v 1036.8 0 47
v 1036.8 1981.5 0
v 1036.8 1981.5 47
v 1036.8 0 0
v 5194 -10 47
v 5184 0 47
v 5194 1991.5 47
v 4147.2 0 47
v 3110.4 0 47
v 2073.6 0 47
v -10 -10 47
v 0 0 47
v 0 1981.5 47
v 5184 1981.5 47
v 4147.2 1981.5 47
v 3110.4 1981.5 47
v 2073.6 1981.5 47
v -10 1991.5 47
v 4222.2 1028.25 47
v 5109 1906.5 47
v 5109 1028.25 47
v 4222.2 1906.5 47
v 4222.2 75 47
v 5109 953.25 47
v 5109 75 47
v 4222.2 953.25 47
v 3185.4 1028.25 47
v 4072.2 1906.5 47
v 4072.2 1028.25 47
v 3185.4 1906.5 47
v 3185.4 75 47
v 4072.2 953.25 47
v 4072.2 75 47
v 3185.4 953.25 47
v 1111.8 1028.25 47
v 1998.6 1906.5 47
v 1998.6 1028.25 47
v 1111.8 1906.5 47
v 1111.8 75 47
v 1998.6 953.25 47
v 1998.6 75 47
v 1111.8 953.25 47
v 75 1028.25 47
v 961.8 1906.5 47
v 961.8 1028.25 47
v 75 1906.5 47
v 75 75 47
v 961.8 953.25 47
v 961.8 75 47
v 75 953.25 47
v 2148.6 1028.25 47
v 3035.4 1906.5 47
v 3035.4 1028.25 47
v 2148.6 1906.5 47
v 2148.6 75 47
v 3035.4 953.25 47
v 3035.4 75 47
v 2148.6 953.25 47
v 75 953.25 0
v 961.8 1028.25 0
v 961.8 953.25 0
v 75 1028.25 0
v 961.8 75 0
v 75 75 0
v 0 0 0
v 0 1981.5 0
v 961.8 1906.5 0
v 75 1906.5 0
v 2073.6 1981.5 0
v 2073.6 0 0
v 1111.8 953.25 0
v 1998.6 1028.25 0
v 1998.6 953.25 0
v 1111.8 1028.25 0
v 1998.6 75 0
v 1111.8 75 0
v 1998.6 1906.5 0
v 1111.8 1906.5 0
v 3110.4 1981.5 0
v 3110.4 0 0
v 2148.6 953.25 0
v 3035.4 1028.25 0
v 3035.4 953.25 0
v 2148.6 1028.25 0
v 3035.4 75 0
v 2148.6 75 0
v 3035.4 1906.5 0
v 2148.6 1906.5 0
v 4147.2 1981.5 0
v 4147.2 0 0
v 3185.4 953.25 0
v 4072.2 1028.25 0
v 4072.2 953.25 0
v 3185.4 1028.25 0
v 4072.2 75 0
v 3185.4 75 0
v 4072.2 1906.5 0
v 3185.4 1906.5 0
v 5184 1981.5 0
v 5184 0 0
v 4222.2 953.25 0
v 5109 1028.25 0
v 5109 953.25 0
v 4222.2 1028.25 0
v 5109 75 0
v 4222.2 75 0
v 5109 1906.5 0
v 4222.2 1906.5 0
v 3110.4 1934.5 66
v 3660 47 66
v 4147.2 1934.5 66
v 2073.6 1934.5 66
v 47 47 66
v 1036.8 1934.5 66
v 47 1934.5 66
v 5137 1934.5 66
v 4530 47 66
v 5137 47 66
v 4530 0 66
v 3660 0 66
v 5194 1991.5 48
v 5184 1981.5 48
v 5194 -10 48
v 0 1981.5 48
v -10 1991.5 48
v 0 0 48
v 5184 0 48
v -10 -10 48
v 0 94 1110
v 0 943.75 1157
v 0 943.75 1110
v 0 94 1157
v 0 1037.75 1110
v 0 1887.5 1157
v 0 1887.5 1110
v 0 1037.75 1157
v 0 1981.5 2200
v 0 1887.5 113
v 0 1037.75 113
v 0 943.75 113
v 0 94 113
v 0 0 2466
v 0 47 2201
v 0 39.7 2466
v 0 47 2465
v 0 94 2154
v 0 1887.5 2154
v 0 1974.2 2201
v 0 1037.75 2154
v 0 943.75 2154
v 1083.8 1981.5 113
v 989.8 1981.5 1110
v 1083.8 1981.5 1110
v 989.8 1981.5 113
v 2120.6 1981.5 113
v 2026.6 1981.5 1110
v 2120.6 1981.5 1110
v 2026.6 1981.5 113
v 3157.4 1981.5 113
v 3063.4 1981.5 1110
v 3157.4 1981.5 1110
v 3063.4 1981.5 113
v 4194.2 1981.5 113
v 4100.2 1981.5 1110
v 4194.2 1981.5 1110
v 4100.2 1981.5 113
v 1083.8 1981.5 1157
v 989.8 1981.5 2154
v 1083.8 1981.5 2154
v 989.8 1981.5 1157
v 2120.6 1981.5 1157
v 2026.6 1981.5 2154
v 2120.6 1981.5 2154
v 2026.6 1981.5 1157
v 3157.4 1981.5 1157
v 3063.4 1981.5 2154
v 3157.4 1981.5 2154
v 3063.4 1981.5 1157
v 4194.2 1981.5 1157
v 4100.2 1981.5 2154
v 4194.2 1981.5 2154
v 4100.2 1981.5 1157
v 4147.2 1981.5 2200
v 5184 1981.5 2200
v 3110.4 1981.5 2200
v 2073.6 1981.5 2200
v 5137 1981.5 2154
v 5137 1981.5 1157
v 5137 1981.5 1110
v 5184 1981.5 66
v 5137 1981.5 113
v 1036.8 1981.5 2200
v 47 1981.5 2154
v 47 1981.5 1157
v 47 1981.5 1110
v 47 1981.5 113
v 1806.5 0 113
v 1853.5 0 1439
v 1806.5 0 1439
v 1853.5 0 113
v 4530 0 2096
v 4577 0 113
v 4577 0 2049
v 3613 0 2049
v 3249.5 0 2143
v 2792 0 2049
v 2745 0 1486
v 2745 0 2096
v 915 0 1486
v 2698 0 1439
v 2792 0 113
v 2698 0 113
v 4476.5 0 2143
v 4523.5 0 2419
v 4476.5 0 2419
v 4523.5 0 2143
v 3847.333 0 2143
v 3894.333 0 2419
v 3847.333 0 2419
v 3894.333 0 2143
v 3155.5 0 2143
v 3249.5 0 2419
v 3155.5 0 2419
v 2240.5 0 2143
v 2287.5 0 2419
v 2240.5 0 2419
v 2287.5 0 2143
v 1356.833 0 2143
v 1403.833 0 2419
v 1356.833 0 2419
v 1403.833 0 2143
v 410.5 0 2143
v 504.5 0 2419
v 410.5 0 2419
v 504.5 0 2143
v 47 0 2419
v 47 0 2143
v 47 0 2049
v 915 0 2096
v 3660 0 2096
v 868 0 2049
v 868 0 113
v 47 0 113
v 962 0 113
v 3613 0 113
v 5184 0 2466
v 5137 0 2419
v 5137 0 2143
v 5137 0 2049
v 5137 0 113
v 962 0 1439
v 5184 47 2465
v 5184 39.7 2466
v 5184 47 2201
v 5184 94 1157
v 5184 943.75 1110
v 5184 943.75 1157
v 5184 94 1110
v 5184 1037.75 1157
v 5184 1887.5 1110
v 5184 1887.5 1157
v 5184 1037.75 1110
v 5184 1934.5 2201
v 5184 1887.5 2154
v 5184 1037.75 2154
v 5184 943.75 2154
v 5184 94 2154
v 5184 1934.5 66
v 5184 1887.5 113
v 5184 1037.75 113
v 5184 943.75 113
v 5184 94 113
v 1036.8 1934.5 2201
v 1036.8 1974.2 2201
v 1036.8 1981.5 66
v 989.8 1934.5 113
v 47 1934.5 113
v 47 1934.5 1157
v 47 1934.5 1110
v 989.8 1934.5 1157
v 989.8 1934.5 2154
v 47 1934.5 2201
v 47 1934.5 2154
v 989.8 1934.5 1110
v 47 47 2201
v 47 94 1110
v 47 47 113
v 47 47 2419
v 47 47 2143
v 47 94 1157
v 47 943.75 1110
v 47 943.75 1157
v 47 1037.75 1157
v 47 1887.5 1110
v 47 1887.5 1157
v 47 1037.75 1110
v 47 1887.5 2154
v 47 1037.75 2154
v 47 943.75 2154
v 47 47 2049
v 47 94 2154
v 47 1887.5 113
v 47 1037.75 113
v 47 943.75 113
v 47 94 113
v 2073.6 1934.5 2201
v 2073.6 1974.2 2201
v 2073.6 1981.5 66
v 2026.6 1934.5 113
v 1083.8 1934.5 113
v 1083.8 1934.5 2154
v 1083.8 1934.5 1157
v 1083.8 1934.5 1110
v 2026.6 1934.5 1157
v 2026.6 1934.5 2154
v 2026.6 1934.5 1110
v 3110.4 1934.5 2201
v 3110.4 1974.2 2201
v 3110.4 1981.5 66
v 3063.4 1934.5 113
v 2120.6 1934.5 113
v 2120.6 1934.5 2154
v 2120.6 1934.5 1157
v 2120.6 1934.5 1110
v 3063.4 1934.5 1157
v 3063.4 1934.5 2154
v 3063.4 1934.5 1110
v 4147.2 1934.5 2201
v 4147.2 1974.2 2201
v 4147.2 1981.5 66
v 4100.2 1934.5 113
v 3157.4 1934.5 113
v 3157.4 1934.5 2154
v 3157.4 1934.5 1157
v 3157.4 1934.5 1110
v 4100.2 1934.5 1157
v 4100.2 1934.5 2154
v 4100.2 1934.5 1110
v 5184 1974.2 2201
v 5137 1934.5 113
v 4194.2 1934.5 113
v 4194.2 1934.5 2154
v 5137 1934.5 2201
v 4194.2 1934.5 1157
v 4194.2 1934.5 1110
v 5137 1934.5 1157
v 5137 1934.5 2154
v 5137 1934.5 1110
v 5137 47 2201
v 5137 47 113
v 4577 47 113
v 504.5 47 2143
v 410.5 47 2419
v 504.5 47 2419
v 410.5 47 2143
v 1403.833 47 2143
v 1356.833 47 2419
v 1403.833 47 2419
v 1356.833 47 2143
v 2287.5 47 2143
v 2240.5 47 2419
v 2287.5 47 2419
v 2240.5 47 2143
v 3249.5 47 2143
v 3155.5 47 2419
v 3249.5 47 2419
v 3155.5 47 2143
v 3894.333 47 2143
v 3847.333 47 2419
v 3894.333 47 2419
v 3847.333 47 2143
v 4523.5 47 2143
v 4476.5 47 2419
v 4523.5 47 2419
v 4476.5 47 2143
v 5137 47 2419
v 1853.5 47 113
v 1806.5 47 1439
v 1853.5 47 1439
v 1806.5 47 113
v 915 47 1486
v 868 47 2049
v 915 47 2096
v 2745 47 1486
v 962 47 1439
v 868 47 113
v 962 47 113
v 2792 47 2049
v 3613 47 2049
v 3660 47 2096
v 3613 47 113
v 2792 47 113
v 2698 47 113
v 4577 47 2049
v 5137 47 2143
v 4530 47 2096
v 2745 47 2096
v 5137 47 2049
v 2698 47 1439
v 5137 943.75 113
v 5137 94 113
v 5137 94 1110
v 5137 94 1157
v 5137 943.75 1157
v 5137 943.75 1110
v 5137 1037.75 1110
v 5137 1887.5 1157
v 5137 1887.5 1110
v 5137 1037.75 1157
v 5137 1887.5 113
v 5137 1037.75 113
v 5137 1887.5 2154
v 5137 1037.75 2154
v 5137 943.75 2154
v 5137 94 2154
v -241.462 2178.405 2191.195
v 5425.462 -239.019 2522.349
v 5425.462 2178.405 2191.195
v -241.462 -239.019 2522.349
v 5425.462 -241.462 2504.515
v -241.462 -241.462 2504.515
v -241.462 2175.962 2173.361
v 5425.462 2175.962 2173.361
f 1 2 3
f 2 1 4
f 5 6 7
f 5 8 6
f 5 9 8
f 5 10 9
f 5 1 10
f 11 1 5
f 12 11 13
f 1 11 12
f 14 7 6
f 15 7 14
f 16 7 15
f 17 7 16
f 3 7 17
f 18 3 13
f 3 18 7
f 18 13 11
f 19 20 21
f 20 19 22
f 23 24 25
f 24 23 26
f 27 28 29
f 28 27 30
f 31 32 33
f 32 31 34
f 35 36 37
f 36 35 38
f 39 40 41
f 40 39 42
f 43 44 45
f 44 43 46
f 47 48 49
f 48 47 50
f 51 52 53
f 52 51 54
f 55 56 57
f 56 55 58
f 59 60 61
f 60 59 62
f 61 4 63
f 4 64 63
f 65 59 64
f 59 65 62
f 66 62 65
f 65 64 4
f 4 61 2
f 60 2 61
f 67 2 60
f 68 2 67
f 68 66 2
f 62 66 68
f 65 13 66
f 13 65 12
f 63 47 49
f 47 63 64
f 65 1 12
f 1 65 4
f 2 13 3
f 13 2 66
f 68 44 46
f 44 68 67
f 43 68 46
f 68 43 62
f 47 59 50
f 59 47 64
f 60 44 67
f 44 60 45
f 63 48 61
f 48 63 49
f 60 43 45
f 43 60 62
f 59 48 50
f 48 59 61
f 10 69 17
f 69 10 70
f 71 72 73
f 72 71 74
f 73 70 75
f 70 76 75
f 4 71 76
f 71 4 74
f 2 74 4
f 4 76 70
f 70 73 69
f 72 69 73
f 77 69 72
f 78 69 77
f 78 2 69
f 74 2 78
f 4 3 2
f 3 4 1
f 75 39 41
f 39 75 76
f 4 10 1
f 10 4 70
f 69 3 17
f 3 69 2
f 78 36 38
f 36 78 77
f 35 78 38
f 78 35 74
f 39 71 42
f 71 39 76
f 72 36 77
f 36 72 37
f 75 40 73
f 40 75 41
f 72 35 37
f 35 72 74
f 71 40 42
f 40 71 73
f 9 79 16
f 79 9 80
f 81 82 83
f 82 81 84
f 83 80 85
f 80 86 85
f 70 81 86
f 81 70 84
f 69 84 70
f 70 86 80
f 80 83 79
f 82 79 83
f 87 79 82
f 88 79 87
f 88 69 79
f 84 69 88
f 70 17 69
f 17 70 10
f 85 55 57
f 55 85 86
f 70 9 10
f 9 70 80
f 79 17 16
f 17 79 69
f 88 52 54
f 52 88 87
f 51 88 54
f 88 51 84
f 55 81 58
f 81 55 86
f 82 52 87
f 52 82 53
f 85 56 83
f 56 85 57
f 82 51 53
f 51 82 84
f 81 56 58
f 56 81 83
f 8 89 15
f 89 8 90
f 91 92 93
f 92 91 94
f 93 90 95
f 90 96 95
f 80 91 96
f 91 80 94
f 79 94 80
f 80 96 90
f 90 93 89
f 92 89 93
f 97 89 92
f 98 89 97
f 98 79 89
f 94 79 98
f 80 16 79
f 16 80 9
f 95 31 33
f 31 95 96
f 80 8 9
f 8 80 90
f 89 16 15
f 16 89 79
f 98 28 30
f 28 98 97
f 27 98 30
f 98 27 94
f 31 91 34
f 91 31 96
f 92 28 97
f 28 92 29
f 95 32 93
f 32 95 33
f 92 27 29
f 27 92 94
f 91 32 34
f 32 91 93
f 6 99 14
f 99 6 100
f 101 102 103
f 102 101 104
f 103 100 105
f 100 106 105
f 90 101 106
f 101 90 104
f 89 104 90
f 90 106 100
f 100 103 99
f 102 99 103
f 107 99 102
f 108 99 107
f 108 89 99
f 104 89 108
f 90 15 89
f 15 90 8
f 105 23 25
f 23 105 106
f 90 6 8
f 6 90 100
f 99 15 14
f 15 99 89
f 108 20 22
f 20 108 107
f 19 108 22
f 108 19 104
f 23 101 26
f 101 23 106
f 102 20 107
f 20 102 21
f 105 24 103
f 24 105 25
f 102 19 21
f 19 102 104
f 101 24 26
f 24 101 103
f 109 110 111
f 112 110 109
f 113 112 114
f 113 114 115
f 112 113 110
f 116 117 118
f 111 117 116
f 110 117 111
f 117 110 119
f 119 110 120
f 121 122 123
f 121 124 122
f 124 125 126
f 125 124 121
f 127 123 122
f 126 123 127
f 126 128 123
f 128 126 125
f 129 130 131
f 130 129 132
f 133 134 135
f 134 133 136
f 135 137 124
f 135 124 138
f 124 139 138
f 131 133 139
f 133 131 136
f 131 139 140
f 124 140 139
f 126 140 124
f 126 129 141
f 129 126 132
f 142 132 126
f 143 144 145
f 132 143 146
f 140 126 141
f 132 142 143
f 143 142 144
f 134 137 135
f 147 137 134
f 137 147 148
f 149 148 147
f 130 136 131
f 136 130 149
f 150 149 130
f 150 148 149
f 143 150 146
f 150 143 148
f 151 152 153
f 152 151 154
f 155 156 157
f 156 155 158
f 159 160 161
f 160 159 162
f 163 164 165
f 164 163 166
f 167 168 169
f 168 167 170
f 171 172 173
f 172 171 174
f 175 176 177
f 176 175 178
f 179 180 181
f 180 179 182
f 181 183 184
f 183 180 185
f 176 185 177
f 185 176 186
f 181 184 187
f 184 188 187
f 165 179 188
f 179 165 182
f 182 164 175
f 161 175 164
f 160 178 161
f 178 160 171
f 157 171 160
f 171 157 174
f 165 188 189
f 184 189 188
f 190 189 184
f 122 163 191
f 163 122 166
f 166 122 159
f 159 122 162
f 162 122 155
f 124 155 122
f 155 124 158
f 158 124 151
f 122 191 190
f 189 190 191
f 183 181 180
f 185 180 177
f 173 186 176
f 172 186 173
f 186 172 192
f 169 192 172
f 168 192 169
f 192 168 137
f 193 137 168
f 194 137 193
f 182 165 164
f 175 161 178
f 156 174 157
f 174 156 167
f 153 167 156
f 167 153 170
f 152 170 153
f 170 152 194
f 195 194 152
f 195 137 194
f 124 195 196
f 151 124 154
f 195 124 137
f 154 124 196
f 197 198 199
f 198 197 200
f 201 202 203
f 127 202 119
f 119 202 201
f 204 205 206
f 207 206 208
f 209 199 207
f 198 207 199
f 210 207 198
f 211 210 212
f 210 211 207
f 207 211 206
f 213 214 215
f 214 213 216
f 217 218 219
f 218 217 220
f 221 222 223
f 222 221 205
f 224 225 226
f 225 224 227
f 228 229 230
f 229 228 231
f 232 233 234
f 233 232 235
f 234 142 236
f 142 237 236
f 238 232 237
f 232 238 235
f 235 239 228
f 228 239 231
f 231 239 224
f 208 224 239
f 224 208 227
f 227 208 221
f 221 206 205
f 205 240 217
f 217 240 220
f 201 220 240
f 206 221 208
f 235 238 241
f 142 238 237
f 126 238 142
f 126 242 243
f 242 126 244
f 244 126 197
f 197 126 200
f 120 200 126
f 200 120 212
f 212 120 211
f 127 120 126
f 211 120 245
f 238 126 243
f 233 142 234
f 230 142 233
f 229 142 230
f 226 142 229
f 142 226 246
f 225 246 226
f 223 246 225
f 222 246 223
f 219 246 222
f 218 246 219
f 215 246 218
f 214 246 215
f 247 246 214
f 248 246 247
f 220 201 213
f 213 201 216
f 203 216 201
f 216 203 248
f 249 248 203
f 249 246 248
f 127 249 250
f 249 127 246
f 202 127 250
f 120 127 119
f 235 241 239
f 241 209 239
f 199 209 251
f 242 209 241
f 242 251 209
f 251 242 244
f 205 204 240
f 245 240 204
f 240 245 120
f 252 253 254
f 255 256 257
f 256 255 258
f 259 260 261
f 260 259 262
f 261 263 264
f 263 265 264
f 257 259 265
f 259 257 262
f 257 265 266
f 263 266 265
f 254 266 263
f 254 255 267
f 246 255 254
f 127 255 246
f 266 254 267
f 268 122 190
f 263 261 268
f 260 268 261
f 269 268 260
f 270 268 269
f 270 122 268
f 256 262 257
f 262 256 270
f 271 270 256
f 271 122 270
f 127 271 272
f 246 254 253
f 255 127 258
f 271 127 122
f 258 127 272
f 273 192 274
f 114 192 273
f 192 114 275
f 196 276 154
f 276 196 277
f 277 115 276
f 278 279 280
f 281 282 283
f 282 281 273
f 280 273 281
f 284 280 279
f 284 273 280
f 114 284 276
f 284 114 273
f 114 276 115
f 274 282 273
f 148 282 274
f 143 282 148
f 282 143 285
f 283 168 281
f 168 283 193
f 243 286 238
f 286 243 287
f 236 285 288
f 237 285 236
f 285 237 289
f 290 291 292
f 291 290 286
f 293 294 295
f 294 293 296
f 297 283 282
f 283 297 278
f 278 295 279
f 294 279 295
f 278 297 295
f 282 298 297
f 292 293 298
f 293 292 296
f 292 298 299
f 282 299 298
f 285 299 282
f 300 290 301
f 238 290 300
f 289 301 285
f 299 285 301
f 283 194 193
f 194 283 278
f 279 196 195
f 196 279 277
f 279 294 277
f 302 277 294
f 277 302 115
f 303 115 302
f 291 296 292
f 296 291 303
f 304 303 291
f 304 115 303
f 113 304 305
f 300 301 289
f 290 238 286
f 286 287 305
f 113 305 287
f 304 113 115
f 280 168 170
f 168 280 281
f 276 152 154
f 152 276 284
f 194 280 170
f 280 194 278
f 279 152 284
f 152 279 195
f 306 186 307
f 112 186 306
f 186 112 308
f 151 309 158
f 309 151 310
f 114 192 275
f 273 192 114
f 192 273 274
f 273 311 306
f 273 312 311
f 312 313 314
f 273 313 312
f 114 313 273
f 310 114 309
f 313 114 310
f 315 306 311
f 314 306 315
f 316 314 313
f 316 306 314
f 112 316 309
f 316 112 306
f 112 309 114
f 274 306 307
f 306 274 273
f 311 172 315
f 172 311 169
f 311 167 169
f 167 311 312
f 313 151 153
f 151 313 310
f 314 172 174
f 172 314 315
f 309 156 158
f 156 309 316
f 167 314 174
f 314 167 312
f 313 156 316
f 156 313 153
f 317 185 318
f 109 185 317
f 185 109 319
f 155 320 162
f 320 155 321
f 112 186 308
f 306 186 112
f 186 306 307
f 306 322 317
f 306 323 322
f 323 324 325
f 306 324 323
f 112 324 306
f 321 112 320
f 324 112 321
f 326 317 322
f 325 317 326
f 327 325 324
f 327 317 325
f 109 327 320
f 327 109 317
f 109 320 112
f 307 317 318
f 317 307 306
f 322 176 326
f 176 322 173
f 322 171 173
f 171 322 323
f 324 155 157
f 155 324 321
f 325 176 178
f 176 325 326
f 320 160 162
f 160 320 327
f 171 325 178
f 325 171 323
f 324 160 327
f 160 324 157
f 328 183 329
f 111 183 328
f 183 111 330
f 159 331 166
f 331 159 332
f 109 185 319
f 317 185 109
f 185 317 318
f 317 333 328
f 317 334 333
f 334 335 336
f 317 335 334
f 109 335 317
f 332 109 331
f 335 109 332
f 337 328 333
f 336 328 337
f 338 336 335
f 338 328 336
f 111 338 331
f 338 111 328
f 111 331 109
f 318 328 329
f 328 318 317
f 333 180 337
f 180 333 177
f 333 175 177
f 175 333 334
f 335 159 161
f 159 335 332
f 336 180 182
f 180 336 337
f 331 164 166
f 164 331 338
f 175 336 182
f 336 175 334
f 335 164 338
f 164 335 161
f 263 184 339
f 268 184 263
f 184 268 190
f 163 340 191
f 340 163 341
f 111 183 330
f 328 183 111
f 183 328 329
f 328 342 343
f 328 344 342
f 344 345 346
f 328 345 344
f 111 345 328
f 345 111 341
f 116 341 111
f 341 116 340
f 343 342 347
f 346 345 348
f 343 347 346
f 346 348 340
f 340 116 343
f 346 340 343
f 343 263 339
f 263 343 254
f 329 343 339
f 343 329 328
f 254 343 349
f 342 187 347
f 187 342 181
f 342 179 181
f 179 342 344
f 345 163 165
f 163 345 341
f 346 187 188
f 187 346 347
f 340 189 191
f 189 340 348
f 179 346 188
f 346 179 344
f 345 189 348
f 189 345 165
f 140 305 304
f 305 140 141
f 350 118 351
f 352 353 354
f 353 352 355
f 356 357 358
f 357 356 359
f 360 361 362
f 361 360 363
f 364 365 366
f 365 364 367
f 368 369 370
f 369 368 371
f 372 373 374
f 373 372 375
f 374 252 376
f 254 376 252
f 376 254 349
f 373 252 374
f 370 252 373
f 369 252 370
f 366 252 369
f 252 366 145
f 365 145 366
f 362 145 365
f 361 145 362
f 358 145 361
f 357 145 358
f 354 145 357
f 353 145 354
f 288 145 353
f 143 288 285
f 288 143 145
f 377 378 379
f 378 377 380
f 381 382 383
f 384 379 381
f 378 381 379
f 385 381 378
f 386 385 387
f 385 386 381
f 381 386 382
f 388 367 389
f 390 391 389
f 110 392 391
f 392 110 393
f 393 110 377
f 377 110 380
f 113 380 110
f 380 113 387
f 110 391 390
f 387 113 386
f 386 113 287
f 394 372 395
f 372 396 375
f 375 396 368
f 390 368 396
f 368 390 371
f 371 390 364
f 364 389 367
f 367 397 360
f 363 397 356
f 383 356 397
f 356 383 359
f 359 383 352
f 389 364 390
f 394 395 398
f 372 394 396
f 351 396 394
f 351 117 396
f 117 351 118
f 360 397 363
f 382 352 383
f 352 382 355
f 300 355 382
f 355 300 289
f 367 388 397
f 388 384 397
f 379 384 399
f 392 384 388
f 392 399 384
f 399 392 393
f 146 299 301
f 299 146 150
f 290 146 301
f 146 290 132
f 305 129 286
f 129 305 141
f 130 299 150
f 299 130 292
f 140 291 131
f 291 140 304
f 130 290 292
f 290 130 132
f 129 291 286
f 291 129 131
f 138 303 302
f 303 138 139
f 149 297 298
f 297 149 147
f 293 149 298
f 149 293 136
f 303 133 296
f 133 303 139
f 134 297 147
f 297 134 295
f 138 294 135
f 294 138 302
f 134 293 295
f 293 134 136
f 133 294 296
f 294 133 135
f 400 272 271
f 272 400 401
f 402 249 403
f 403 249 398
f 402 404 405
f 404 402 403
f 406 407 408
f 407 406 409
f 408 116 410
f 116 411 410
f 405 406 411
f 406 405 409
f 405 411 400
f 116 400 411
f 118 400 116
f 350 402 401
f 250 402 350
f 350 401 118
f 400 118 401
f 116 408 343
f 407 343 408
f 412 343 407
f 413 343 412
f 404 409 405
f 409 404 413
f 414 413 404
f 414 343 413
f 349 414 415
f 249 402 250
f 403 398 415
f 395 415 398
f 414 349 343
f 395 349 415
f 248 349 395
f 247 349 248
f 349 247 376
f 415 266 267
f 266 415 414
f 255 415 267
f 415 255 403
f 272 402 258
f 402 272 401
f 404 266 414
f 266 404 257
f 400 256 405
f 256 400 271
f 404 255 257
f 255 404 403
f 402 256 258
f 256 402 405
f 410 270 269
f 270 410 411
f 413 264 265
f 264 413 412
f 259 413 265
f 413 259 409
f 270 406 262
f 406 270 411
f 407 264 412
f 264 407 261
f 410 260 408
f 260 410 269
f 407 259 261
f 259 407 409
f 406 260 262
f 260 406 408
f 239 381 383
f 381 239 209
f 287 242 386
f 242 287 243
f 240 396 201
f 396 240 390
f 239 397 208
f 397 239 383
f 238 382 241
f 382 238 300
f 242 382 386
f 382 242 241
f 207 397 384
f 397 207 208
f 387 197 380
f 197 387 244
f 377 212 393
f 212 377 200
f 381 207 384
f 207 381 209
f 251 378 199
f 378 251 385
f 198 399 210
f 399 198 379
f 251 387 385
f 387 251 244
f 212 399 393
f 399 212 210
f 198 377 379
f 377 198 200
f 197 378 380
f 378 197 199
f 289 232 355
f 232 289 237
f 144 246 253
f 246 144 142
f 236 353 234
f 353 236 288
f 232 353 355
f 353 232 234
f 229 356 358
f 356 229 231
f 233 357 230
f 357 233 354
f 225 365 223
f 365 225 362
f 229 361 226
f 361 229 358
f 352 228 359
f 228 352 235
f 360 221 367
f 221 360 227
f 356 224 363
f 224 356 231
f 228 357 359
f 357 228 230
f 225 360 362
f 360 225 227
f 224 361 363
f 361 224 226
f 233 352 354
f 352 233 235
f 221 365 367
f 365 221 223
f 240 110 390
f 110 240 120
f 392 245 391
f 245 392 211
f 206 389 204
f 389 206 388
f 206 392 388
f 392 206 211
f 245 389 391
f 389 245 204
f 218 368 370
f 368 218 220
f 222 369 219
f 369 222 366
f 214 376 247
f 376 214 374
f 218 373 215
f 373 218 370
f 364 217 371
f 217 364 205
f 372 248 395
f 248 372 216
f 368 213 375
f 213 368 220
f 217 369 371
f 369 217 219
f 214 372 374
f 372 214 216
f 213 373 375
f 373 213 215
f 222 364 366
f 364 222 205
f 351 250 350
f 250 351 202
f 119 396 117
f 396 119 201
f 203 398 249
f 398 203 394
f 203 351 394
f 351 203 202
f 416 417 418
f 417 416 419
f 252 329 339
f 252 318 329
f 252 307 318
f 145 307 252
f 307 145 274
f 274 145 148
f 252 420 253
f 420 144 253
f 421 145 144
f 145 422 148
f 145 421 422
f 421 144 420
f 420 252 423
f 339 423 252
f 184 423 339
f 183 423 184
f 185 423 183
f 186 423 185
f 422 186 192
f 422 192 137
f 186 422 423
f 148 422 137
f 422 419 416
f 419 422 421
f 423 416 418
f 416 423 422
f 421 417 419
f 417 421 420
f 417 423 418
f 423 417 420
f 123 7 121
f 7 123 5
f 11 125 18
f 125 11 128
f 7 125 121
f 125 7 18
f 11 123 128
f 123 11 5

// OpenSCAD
shed_length = 5184;
shed_width = 1829+305/2;
shed_front_height = 2400;
shed_front_back = 2135;
base_timber = 47;
base_sheet_t = 18;



module cubeI(size,center=false)
{
    echo("Dim: ",size);
    cube(size, center=center);
}


module shedBaseSection(x,y,timber_width=75,timber_length=47, braces=0)
{
    echo("shedBaseSection: x,y,timber_width,timber_length, braces ", x,y,timber_width,timber_length, braces);
    echo("http://www.wickes.co.uk/Wickes-Sawn-Kiln-Dried-47X75-x-3000mm-Single/p/107186#tab-DynamicDeliveryWebTab_content");
    cubeI([x,timber_width,timber_length]);
    translate([0,y-timber_width,0]) cubeI([x,timber_width,timber_length]);
    translate([0,timber_width,0]) cubeI([timber_width,y-timber_width*2,timber_length]);
    translate([x-timber_width,timber_width,0]) cubeI([timber_width,y-timber_width*2,timber_length]);
    if(braces > 0)
    {
        middle_y = y - timber_width*2;
        part_y = middle_y/(braces+1);
        for(loop=[1 : braces ])
        {
                translate([timber_width,timber_width/(braces+1) + (loop*part_y),0]) cubeI([x-timber_width*2, timber_width,timber_length]);            
        }            
    }
}


module shedBase(x,y,number_x,number_y, braces=1)
{
    for(base_y = [0 : number_y-1])
    {
        for(base_x = [0 : number_x-1])
            {
                translate([base_x*(x/number_x),base_y*(y/number_y),0]) shedBaseSection(x/number_x,y/number_y, braces = braces);
            }
    }
}


module floorMembrane(x,y,thickness,color="Black", overlap=10)
{
    echo("x,y,thickness=1,color, overlap=1",x,y,thickness,color, overlap);
    echo("http://www.screwfix.com/p/dmp-damp-proof-membrane-black-1000ga-3-x-4m/50464#product_additional_details_container");
    translate([-overlap,-overlap,0]) color(color, 1) cube([x+overlap*2,y+overlap*2, thickness]);
}


//module shedLowerFloor(x,y, panel_slf_w = 607, panel_slf_l =   1829, panel_slf_t =   5.5, panel_min_dimentions = 100)
module shedLowerFloor(x,y, panel_slf_w = 1220, panel_slf_l = 2440, panel_slf_t = base_sheet_t, panel_min_dimentions = 100)
{
//    echo("http://www.wickes.co.uk/Wickes-Non-Structural-Hardwood-Plywood-5-5x607x1829mm/p/111196");
    echo("http://www.wickes.co.uk/Wickes-General-Purpose-OSB3-Board-18x1220x2440mm/p/110517");
    x_panels = round(-0.5+x/panel_slf_w);
    y_panels = round(-0.5+y/panel_slf_l);
    echo(y_panels);
    if(y_panels>0) // Panel is Not longer than width
    {
        for(base_y = [0 : y_panels-1]) //Truncate not round
        {
            for(base_x = [0 : x_panels-1])
            {
                translate([base_x*panel_slf_w,base_y*panel_slf_l,0]) cubeI([panel_slf_w, panel_slf_l,panel_slf_t]);
                if(y-(panel_slf_l*y_panels) > panel_min_dimentions)
                translate([base_x*panel_slf_w,y_panels*panel_slf_l,0]) cubeI([panel_slf_w, y-(panel_slf_l*y_panels),panel_slf_t]);
                }
            if(x-(panel_slf_w*x_panels) > panel_min_dimentions)
                translate([(x_panels)*panel_slf_w,(y_panels-1)*panel_slf_l,0]) cubeI([x-(panel_slf_w*x_panels), panel_slf_l,panel_slf_t]); 
            if(y-(panel_slf_l*y_panels) > panel_min_dimentions)
                translate([(x_panels)*panel_slf_w,y_panels*panel_slf_l,0]) cubeI([x-(panel_slf_w*x_panels), y-(panel_slf_l*y_panels),panel_slf_t]);
        }
    }
    else // Panel is longer than width
    {
     for(base_x = [0 : x_panels-1])
     {
        translate([base_x*panel_slf_w,0,0]) cubeI([panel_slf_w, y,panel_slf_t]);       
     }
     if(x-(panel_slf_w*x_panels) > panel_min_dimentions)
                translate([(x_panels)*panel_slf_w,0,0]) cubeI([x-(panel_slf_w*x_panels), y,panel_slf_t]); 
    }
}


module verticalStruts(x,z,timber_width=47,timber_length=47, braces=0, beams=0)
{
//    echo("shedBaseSection(x,z,timber_width,timber_length, braces",x,z,timber_width,timber_length, braces);
//    echo("Walls - http://www.wickes.co.uk/Wickes-Sawn-Kiln-Dried-47-x-47-x-2400mm-Pack-6/p/107114");
    cubeI([x,timber_width,timber_length]);
    translate([0,0,z-timber_width]) cubeI([x,timber_width,timber_length]);
    translate([0,0,timber_width]) cubeI([timber_width,timber_length,z-timber_width*2]);
    translate([x-timber_width,0,timber_width]) cubeI([timber_width,timber_length,z-timber_width*2]);
    if(braces > 0)
    {
        middle_z = z - timber_width*2;
        part_z = middle_z/(braces+1);
        for(loop=[1 : braces ])
        {
                translate([timber_width,0,timber_width/(braces+1) + (loop*part_z)]) cubeI([x-timber_width*2, timber_width,timber_length]);            
        }
    }
    if(beams> 0)
    {
        middle_x = x - timber_length*2;
        part_x = middle_x/(beams+1);
        for(loop=[1 : beams ])
        {
                translate([timber_length/(beams+1) + (loop*part_x),0,timber_width]) cubeI([timber_length, timber_width,z-timber_length*2]);            
        }  
    }
}


module backWallStruts(x,z,number_x, braces=1)
{
    echo("backWallStruts(x,z,number_x, braces)",x,z,number_x, braces);
        for(base_x = [0 : number_x-1])
            {
                translate([base_x*(x/number_x),0,0]) verticalStruts(x/number_x,z, braces = braces);
            }
}

module sideWallStruts(x,z,number_x, braces=1)
{
    echo("sideWallStruts(x,z,number_x, braces)",x,z,number_x, braces);
    rotate([0,0,90]) backWallStruts(x,z,number_x, braces);
}


module frontWallStruts(x,z, space_to_window_w, space_to_window_h, window_w, window_h, door_w, door_h, braces)
{
    echo("frontWallStruts(x,z,space_to_window_w, space_to_window_h, window_w, window_h, door_w, braces)", x,z, space_to_window_w, space_to_window_h, window_w, window_h, door_w, door_h, braces);
    translate([0,0,0]) verticalStruts(space_to_window_w,space_to_window_h+window_h, braces = braces);
    translate([space_to_window_w,0,0]) verticalStruts(window_w,space_to_window_h, braces = braces, beams=1);
    translate([0,0,space_to_window_h+window_h]) verticalStruts(space_to_window_w/2,z-(space_to_window_h+window_h), braces = braces);
    translate([space_to_window_w/2,0,space_to_window_h+window_h]) verticalStruts(window_w+space_to_window_w,z-(space_to_window_h+window_h), braces = braces, beams=2);
    translate([space_to_window_w+window_w,0,0]) verticalStruts(space_to_window_w,space_to_window_h+window_h, braces = braces);
    if(door_h-(space_to_window_h+window_h>0))  translate([space_to_window_w/2+window_w+space_to_window_w,0,space_to_window_h+window_h]) verticalStruts(space_to_window_w/2,door_h-(space_to_window_h+window_h), braces = braces);
    translate([space_to_window_w/2+window_w+space_to_window_w,0,door_h]) verticalStruts(x-(space_to_window_w/2+window_w+space_to_window_w),z-door_h, braces = braces, beams=2);
    translate([space_to_window_w+window_w+space_to_window_w+door_w,0,0]) verticalStruts(x-(space_to_window_w+window_w+space_to_window_w+door_w),door_h, braces = braces);
}

module roof(x,y,z_front,z_back, panel_slf_w = 1220, panel_slf_l = 2440, panel_slf_t = base_sheet_t)
{
    opp = z_front-z_back;
    adj = y - base_timber;
    hyp = sqrt(opp*opp+adj*adj);
    theta = atan(opp/adj);
    overhang = (panel_slf_l-hyp)/2;
    overhang_flat = cos(theta) * overhang;
    overhang_up = sin(theta) * overhang;
    
    // Want it to line up with front of timber truct not back
    height_adjust = base_timber * tan(theta);
    echo("overhang", overhang, opp, hyp, theta, height_adjust, overhang_flat, overhang_up);
    translate([-overhang_flat,-overhang_flat,z_front+base_timber+panel_slf_t+height_adjust+overhang_up]) rotate([-theta,0,0]) 
    {
        shedLowerFloor(x+overhang_flat*2,panel_slf_l);
    }
}



shedBase(shed_length, shed_width, number_x=5,number_y=1, braces=1);
translate([0,0,base_timber]) floorMembrane(shed_length, shed_width, thickness = 1);
translate([0,0,base_timber+1]) shedLowerFloor(shed_length, shed_width);
translate([0,shed_width-base_timber,base_timber+1+base_sheet_t])  backWallStruts(shed_length, shed_front_back, 5);
translate([base_timber,base_timber,base_timber+1+base_sheet_t])  sideWallStruts(shed_width-base_timber*2,shed_front_back,2, braces=1);
translate([shed_length,base_timber,base_timber+1+base_sheet_t])  sideWallStruts(shed_width-base_timber*2,shed_front_back,2, braces=1);

translate([0,0,base_timber+1+base_sheet_t])  frontWallStruts(shed_length,shed_front_height, space_to_window_w=1830/2, space_to_window_h=2030-610, window_w=1830, window_h=610, door_w=870, , door_h=2030, braces=0);

roof(shed_length, shed_width,shed_front_height,shed_front_back);

//shedBaseSection(shed_length/6,shed_width, braces = 1);
